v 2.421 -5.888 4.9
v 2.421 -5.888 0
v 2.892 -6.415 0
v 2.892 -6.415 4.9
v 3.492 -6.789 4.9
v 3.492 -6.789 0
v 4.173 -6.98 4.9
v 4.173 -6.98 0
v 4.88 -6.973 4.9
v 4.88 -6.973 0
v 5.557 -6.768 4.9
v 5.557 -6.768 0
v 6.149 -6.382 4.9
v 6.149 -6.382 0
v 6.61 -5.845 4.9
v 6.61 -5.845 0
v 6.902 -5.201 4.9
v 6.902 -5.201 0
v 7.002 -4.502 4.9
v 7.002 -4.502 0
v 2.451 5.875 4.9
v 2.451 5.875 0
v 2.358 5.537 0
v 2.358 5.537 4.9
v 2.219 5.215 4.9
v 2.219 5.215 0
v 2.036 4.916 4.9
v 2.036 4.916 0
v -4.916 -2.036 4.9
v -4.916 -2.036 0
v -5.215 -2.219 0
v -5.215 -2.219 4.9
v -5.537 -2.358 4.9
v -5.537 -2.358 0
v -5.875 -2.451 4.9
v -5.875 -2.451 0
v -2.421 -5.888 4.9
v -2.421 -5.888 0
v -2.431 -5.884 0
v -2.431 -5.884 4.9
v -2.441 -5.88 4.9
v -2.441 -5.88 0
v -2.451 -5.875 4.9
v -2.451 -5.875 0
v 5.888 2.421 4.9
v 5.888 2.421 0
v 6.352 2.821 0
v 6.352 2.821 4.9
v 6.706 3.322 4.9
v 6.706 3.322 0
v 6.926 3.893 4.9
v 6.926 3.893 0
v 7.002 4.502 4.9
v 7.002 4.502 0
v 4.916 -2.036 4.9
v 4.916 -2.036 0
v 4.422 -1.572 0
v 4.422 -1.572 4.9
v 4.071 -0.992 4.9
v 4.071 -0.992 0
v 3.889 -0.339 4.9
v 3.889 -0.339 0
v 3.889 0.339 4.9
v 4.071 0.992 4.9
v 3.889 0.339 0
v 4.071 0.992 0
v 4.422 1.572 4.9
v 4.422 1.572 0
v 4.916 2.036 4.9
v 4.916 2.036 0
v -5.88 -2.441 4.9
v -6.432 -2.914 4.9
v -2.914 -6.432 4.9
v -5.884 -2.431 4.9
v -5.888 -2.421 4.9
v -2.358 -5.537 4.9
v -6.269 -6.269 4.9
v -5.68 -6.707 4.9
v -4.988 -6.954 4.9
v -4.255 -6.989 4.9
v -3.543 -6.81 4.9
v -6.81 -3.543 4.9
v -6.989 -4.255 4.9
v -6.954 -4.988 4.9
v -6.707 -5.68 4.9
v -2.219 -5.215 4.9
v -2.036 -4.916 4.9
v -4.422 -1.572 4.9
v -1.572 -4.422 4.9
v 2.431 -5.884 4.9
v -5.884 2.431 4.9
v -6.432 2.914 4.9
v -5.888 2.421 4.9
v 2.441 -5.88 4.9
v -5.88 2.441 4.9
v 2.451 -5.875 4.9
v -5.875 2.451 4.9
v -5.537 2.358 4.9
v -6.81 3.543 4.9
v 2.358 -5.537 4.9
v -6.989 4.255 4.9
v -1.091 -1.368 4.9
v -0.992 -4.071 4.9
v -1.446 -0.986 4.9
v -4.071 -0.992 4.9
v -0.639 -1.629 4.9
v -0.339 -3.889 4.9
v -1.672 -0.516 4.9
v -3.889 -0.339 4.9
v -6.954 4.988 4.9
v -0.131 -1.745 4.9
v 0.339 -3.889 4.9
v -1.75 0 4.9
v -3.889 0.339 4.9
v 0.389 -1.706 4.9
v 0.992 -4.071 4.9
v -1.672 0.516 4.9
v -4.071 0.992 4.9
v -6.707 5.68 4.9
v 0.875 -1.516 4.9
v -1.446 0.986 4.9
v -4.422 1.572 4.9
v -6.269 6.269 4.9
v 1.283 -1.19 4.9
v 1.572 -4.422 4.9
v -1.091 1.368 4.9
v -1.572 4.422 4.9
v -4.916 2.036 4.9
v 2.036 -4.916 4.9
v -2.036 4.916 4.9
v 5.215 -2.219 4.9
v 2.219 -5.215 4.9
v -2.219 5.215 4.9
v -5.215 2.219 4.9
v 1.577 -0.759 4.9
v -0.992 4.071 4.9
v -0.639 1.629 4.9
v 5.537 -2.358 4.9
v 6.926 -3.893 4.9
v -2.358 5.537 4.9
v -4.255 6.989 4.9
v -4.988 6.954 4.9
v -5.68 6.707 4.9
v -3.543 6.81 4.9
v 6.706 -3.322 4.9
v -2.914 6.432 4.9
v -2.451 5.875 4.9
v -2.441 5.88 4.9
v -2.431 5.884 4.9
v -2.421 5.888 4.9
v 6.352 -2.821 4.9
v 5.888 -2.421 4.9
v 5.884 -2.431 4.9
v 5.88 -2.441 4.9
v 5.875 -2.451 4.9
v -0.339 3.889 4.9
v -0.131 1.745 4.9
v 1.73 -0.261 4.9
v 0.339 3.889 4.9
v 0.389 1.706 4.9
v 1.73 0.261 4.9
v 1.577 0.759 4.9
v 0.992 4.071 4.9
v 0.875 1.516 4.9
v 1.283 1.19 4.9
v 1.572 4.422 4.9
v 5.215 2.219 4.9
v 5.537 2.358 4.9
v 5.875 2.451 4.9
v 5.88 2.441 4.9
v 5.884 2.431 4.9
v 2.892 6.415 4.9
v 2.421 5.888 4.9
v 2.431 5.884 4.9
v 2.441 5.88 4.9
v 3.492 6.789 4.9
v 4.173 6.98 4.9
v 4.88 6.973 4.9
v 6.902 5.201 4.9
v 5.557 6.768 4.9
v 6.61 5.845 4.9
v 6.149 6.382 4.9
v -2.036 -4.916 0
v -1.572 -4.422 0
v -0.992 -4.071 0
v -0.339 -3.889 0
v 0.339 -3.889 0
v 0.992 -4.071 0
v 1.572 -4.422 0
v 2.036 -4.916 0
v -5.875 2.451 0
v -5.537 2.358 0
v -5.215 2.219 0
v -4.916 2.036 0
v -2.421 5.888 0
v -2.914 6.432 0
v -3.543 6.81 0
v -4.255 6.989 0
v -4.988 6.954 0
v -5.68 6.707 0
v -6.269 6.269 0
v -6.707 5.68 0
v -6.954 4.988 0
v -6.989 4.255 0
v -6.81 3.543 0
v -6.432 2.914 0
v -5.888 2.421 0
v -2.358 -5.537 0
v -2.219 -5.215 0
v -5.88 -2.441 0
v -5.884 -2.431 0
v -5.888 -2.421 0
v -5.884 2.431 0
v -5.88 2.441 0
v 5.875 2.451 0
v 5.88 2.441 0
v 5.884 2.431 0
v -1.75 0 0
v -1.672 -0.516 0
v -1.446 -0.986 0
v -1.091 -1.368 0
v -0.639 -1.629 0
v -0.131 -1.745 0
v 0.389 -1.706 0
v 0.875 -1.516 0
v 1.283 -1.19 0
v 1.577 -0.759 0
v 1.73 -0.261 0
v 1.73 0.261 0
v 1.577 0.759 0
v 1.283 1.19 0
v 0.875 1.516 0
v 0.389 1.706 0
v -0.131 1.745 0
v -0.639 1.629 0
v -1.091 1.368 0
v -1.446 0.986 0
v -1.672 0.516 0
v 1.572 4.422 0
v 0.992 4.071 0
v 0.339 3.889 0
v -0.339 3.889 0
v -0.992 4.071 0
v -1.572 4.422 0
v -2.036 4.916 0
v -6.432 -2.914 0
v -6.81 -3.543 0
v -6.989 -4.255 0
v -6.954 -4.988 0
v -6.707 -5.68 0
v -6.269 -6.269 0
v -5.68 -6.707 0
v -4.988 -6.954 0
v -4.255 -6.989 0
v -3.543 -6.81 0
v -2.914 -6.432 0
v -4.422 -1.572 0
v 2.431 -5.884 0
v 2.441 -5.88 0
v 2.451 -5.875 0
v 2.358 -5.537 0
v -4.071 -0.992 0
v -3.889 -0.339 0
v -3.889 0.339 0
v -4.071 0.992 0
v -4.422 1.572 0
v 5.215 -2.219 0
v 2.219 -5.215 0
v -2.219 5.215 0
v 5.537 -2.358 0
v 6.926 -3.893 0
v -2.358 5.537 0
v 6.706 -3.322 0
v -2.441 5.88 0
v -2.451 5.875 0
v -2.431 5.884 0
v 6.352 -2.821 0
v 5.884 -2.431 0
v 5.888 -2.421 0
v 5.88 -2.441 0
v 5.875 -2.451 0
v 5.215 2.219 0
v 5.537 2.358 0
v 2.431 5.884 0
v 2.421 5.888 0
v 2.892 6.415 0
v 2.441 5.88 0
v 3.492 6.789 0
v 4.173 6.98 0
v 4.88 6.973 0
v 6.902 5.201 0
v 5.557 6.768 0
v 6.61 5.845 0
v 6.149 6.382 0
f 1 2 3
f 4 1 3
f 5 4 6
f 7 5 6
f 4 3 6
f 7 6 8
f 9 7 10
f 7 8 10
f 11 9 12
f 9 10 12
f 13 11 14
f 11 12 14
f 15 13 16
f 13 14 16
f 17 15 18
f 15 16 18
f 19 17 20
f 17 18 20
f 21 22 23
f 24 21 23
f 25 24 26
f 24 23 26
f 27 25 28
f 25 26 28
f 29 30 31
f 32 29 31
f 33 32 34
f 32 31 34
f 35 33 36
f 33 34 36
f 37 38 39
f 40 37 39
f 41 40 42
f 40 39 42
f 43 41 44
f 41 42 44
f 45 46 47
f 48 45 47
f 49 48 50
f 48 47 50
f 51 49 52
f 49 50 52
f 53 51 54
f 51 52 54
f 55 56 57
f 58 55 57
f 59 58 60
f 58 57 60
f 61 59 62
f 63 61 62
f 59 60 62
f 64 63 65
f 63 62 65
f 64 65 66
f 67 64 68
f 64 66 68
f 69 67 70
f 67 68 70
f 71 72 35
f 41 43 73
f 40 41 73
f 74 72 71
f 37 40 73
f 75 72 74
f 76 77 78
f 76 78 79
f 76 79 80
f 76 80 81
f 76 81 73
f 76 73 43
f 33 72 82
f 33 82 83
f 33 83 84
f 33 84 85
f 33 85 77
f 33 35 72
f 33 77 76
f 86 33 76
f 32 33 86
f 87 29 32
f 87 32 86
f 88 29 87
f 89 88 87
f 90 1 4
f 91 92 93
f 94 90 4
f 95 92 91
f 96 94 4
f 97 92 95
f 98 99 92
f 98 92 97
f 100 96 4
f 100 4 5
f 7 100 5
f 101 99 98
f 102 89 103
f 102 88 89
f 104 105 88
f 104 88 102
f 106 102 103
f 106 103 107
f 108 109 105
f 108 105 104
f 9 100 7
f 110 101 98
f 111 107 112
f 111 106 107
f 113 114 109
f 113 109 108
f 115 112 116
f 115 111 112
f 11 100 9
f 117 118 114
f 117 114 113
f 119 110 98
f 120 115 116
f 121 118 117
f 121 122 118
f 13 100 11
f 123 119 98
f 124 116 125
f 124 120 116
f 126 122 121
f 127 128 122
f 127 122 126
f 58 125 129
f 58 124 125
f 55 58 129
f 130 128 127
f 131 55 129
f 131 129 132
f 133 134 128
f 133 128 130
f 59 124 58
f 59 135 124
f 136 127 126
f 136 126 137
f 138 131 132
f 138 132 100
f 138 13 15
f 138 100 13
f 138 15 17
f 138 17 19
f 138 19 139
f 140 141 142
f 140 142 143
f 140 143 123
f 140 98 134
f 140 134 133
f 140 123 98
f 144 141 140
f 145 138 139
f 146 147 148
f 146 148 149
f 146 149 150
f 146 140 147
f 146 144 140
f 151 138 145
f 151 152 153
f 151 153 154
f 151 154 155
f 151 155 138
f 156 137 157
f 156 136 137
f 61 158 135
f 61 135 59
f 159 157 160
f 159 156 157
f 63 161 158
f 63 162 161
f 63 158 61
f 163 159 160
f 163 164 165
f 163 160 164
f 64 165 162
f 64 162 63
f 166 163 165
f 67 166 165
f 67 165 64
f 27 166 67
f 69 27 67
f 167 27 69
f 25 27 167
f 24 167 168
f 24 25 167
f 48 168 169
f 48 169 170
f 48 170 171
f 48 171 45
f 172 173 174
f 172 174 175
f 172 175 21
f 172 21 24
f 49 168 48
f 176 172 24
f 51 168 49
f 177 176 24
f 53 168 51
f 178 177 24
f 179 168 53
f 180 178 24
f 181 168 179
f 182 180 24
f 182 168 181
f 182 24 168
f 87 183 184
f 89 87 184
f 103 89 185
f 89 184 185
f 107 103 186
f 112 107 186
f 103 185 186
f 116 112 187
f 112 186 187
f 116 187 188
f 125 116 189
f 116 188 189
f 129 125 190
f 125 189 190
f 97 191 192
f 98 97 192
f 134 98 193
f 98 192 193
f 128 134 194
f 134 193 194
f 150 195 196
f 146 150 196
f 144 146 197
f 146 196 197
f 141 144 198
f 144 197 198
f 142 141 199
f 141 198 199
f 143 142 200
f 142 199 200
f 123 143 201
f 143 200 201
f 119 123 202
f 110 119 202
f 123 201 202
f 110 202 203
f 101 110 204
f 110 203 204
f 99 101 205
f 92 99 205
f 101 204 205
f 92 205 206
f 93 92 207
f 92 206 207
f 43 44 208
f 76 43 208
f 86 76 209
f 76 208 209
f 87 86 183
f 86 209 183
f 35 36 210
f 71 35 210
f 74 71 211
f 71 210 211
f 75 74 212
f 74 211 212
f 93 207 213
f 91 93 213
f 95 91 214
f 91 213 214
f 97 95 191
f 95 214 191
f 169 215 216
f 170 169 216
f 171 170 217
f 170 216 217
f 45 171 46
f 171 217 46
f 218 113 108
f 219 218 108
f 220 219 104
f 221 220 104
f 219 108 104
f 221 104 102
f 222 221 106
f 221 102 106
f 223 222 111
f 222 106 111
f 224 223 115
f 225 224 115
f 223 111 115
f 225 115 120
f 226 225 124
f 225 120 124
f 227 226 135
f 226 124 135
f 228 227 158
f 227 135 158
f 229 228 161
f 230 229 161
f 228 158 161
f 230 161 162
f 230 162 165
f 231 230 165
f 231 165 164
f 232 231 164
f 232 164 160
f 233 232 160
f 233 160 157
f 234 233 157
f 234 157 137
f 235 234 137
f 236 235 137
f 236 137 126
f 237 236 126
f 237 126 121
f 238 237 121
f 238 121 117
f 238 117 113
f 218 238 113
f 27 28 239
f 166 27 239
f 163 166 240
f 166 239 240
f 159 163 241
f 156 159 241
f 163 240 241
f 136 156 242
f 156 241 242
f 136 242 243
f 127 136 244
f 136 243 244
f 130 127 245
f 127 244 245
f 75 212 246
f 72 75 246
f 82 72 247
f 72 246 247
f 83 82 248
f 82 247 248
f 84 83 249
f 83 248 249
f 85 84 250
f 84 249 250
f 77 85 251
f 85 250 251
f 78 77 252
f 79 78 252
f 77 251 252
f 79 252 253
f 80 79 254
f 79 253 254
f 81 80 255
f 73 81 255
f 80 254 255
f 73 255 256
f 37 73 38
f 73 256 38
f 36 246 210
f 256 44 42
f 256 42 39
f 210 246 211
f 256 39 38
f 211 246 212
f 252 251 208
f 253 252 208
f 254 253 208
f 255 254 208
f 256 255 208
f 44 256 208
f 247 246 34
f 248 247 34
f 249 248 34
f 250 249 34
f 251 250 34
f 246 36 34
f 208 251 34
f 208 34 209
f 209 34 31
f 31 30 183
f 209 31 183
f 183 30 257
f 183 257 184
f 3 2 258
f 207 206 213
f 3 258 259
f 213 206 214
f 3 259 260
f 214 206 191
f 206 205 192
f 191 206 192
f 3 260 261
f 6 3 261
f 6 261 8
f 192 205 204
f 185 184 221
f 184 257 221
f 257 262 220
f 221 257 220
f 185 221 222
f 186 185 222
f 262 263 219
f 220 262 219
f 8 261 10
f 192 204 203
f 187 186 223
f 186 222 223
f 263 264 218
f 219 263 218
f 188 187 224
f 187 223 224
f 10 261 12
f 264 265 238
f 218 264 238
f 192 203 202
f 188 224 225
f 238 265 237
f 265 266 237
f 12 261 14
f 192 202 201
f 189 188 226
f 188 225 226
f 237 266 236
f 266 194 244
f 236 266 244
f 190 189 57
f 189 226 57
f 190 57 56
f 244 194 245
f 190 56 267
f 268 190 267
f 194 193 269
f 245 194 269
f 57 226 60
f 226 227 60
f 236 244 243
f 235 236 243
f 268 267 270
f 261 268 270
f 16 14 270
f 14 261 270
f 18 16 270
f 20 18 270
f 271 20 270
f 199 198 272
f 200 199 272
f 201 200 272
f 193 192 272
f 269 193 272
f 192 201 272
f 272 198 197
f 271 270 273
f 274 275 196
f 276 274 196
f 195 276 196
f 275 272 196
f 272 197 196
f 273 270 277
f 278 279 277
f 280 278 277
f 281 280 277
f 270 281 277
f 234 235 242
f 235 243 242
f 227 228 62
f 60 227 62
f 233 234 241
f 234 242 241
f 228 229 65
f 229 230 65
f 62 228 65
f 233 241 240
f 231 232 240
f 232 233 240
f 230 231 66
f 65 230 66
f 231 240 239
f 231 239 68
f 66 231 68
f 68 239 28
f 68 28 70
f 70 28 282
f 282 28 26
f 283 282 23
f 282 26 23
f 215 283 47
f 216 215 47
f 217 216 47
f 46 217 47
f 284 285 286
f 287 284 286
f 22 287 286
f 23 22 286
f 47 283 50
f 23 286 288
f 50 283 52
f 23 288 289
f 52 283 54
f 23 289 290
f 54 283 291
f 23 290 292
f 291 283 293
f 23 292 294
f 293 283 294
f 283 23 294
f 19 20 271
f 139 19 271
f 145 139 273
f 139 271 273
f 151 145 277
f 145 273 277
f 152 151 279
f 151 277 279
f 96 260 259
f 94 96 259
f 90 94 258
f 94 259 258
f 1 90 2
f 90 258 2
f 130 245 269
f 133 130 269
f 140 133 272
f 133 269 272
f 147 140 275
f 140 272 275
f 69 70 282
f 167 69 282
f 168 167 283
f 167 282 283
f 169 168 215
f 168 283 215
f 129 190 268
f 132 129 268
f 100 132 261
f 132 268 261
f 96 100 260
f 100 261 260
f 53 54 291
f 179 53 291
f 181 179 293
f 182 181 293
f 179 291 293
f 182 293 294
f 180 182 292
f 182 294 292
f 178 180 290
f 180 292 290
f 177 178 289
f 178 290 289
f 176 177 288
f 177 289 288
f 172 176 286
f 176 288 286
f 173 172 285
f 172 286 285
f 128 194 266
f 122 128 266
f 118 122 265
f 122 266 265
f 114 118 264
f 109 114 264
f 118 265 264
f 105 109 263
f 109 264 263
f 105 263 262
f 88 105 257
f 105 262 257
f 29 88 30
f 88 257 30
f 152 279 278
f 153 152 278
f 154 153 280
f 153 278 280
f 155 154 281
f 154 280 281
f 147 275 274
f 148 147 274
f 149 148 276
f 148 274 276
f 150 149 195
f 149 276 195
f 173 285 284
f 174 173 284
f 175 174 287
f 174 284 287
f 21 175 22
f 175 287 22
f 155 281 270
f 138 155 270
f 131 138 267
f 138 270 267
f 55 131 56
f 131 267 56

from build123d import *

# Parameters (mm, degrees)
F1_DEPTH = 4.9
F2_D     = 3.5


with BuildPart() as f1:
    # F0 (on Top) → F1 (new body)
    with BuildSketch(Plane.XY):
        with BuildLine():
            ThreePointArc((-2.4513349141, 5.8753238716), (-2.436238396, 5.8815997768), (-2.4211258105, 5.887836892))
            ThreePointArc((-2.4211258105, 5.887836892), (-6.2693485338, 6.2693485338), (-5.887836892, 2.4211258105))
            ThreePointArc((-5.887836892, 2.4211258105), (-5.8815997768, 2.436238396), (-5.8753238716, 2.4513349141))
            ThreePointArc((-5.8753238716, 2.4513349141), (-5.2887540631, 3.5436639114), (-4.5015815808, 4.5015815808))
            ThreePointArc((-4.5015815808, 4.5015815808), (-3.5436639114, 5.2887540631), (-2.4513349141, 5.8753238716))
        make_face()
        with BuildLine():
            ThreePointArc((2.4513349141, 5.8753238716), (4.5015815808, 4.5015815808), (5.8753238716, 2.4513349141))
            ThreePointArc((5.8753238716, 2.4513349141), (5.8815997768, 2.436238396), (5.887836892, 2.4211258105))
            ThreePointArc((5.887836892, 2.4211258105), (6.7056276645, 3.32167444), (7.0015815808, 4.5015815808))
            ThreePointArc((7.0015815808, 4.5015815808), (5.2257571722, 6.8943978531), (2.4211258105, 5.887836892))
            ThreePointArc((2.4211258105, 5.887836892), (2.436238396, 5.8815997768), (2.4513349141, 5.8753238716))
        make_face()
        with BuildLine():
            ThreePointArc((4.9155755495, -2.0360980595), (3.8661977237, 0), (4.9155755495, 2.0360980595))
            ThreePointArc((4.9155755495, 2.0360980595), (2.7338146278, 2.7338146278), (2.0360980595, 4.9155755495))
            ThreePointArc((2.0360980595, 4.9155755495), (0, 3.8661977237), (-2.0360980595, 4.9155755495))
            ThreePointArc((-2.0360980595, 4.9155755495), (-2.0102256444, 4.7092967665), (-2.0015815808, 4.5015815808))
            ThreePointArc((-2.0015815808, 4.5015815808), (-2.1918827495, 3.5448729999), (-2.7338146278, 2.7338146278))
            ThreePointArc((-2.7338146278, 2.7338146278), (-3.7400847484, 2.1203796628), (-4.9155755495, 2.0360980595))
            ThreePointArc((-4.9155755495, 2.0360980595), (-3.8661977237, 0), (-4.9155755495, -2.0360980595))
            ThreePointArc((-4.9155755495, -2.0360980595), (-2.8868037202, -2.5930500875), (-2.0015815808, -4.5015815808))
            ThreePointArc((-2.0015815808, -4.5015815808), (-2.0102256444, -4.7092967665), (-2.0360980595, -4.9155755495))
            ThreePointArc((-2.0360980595, -4.9155755495), (0, -3.8661977237), (2.0360980595, -4.9155755495))
            ThreePointArc((2.0360980595, -4.9155755495), (2.7338146278, -2.7338146278), (4.9155755495, -2.0360980595))
        make_face()
        with BuildLine():
            ThreePointArc((7.0015815808, -4.5015815808), (6.7056276645, -3.32167444), (5.887836892, -2.4211258105))
            ThreePointArc((5.887836892, -2.4211258105), (5.8815997768, -2.436238396), (5.8753238716, -2.4513349141))
            ThreePointArc((5.8753238716, -2.4513349141), (4.5015815808, -4.5015815808), (2.4513349141, -5.8753238716))
            ThreePointArc((2.4513349141, -5.8753238716), (2.436238396, -5.8815997768), (2.4211258105, -5.887836892))
            ThreePointArc((2.4211258105, -5.887836892), (5.2257571722, -6.8943978531), (7.0015815808, -4.5015815808))
        make_face()
        with BuildLine():
            ThreePointArc((-5.8753238716, -2.4513349141), (-5.8815997768, -2.436238396), (-5.887836892, -2.4211258105))
            ThreePointArc((-5.887836892, -2.4211258105), (-6.2693485338, -6.2693485338), (-2.4211258105, -5.887836892))
            ThreePointArc((-2.4211258105, -5.887836892), (-2.436238396, -5.8815997768), (-2.4513349141, -5.8753238716))
            ThreePointArc((-2.4513349141, -5.8753238716), (-4.5015815808, -4.5015815808), (-5.8753238716, -2.4513349141))
        make_face()
        with BuildLine():
            ThreePointArc((4.9155755495, 2.0360980595), (5.3734957964, 2.2944591702), (5.8753238716, 2.4513349141))
            ThreePointArc((5.8753238716, 2.4513349141), (4.5015815808, 4.5015815808), (2.4513349141, 5.8753238716))
            ThreePointArc((2.4513349141, 5.8753238716), (2.2944591702, 5.3734957964), (2.0360980595, 4.9155755495))
            ThreePointArc((2.0360980595, 4.9155755495), (2.7338146278, 2.7338146278), (4.9155755495, 2.0360980595))
        make_face()
        with BuildLine():
            Line((-2.7338146278, 2.7338146278), (-4.5015815808, 4.5015815808))
            ThreePointArc((-4.5015815808, 4.5015815808), (-5.2887540631, 3.5436639114), (-5.8753238716, 2.4513349141))
            ThreePointArc((-5.8753238716, 2.4513349141), (-5.3734957964, 2.2944591702), (-4.9155755495, 2.0360980595))
            ThreePointArc((-4.9155755495, 2.0360980595), (-3.7400847484, 2.1203796628), (-2.7338146278, 2.7338146278))
        make_face()
        with BuildLine():
            ThreePointArc((-2.4513349141, -5.8753238716), (-2.2944591702, -5.3734957964), (-2.0360980595, -4.9155755495))
            ThreePointArc((-2.0360980595, -4.9155755495), (-2.0102256444, -4.7092967665), (-2.0015815808, -4.5015815808))
            ThreePointArc((-2.0015815808, -4.5015815808), (-2.8868037202, -2.5930500875), (-4.9155755495, -2.0360980595))
            ThreePointArc((-4.9155755495, -2.0360980595), (-5.3734957964, -2.2944591702), (-5.8753238716, -2.4513349141))
            ThreePointArc((-5.8753238716, -2.4513349141), (-4.5015815808, -4.5015815808), (-2.4513349141, -5.8753238716))
        make_face()
        with BuildLine():
            ThreePointArc((-2.0015815808, 4.5015815808), (-2.0102256444, 4.7092967665), (-2.0360980595, 4.9155755495))
            ThreePointArc((-2.0360980595, 4.9155755495), (-2.2944591702, 5.3734957964), (-2.4513349141, 5.8753238716))
            ThreePointArc((-2.4513349141, 5.8753238716), (-3.5436639114, 5.2887540631), (-4.5015815808, 4.5015815808))
            Line((-4.5015815808, 4.5015815808), (-2.7338146278, 2.7338146278))
            ThreePointArc((-2.7338146278, 2.7338146278), (-2.1918827495, 3.5448729999), (-2.0015815808, 4.5015815808))
        make_face()
        with BuildLine():
            ThreePointArc((5.8753238716, -2.4513349141), (5.3734957964, -2.2944591702), (4.9155755495, -2.0360980595))
            ThreePointArc((4.9155755495, -2.0360980595), (2.7338146278, -2.7338146278), (2.0360980595, -4.9155755495))
            ThreePointArc((2.0360980595, -4.9155755495), (2.2944591702, -5.3734957964), (2.4513349141, -5.8753238716))
            ThreePointArc((2.4513349141, -5.8753238716), (4.5015815808, -4.5015815808), (5.8753238716, -2.4513349141))
        make_face()
    extrude(amount=F1_DEPTH)

    # F2 (through all)
    with Locations(Plane(origin=(0, 0, 0), x_dir=(1, 0, 0), z_dir=(0, 0, -1))):
        with Locations((0, 0)):
            Hole(F2_D / 2)


solid = f1.part
